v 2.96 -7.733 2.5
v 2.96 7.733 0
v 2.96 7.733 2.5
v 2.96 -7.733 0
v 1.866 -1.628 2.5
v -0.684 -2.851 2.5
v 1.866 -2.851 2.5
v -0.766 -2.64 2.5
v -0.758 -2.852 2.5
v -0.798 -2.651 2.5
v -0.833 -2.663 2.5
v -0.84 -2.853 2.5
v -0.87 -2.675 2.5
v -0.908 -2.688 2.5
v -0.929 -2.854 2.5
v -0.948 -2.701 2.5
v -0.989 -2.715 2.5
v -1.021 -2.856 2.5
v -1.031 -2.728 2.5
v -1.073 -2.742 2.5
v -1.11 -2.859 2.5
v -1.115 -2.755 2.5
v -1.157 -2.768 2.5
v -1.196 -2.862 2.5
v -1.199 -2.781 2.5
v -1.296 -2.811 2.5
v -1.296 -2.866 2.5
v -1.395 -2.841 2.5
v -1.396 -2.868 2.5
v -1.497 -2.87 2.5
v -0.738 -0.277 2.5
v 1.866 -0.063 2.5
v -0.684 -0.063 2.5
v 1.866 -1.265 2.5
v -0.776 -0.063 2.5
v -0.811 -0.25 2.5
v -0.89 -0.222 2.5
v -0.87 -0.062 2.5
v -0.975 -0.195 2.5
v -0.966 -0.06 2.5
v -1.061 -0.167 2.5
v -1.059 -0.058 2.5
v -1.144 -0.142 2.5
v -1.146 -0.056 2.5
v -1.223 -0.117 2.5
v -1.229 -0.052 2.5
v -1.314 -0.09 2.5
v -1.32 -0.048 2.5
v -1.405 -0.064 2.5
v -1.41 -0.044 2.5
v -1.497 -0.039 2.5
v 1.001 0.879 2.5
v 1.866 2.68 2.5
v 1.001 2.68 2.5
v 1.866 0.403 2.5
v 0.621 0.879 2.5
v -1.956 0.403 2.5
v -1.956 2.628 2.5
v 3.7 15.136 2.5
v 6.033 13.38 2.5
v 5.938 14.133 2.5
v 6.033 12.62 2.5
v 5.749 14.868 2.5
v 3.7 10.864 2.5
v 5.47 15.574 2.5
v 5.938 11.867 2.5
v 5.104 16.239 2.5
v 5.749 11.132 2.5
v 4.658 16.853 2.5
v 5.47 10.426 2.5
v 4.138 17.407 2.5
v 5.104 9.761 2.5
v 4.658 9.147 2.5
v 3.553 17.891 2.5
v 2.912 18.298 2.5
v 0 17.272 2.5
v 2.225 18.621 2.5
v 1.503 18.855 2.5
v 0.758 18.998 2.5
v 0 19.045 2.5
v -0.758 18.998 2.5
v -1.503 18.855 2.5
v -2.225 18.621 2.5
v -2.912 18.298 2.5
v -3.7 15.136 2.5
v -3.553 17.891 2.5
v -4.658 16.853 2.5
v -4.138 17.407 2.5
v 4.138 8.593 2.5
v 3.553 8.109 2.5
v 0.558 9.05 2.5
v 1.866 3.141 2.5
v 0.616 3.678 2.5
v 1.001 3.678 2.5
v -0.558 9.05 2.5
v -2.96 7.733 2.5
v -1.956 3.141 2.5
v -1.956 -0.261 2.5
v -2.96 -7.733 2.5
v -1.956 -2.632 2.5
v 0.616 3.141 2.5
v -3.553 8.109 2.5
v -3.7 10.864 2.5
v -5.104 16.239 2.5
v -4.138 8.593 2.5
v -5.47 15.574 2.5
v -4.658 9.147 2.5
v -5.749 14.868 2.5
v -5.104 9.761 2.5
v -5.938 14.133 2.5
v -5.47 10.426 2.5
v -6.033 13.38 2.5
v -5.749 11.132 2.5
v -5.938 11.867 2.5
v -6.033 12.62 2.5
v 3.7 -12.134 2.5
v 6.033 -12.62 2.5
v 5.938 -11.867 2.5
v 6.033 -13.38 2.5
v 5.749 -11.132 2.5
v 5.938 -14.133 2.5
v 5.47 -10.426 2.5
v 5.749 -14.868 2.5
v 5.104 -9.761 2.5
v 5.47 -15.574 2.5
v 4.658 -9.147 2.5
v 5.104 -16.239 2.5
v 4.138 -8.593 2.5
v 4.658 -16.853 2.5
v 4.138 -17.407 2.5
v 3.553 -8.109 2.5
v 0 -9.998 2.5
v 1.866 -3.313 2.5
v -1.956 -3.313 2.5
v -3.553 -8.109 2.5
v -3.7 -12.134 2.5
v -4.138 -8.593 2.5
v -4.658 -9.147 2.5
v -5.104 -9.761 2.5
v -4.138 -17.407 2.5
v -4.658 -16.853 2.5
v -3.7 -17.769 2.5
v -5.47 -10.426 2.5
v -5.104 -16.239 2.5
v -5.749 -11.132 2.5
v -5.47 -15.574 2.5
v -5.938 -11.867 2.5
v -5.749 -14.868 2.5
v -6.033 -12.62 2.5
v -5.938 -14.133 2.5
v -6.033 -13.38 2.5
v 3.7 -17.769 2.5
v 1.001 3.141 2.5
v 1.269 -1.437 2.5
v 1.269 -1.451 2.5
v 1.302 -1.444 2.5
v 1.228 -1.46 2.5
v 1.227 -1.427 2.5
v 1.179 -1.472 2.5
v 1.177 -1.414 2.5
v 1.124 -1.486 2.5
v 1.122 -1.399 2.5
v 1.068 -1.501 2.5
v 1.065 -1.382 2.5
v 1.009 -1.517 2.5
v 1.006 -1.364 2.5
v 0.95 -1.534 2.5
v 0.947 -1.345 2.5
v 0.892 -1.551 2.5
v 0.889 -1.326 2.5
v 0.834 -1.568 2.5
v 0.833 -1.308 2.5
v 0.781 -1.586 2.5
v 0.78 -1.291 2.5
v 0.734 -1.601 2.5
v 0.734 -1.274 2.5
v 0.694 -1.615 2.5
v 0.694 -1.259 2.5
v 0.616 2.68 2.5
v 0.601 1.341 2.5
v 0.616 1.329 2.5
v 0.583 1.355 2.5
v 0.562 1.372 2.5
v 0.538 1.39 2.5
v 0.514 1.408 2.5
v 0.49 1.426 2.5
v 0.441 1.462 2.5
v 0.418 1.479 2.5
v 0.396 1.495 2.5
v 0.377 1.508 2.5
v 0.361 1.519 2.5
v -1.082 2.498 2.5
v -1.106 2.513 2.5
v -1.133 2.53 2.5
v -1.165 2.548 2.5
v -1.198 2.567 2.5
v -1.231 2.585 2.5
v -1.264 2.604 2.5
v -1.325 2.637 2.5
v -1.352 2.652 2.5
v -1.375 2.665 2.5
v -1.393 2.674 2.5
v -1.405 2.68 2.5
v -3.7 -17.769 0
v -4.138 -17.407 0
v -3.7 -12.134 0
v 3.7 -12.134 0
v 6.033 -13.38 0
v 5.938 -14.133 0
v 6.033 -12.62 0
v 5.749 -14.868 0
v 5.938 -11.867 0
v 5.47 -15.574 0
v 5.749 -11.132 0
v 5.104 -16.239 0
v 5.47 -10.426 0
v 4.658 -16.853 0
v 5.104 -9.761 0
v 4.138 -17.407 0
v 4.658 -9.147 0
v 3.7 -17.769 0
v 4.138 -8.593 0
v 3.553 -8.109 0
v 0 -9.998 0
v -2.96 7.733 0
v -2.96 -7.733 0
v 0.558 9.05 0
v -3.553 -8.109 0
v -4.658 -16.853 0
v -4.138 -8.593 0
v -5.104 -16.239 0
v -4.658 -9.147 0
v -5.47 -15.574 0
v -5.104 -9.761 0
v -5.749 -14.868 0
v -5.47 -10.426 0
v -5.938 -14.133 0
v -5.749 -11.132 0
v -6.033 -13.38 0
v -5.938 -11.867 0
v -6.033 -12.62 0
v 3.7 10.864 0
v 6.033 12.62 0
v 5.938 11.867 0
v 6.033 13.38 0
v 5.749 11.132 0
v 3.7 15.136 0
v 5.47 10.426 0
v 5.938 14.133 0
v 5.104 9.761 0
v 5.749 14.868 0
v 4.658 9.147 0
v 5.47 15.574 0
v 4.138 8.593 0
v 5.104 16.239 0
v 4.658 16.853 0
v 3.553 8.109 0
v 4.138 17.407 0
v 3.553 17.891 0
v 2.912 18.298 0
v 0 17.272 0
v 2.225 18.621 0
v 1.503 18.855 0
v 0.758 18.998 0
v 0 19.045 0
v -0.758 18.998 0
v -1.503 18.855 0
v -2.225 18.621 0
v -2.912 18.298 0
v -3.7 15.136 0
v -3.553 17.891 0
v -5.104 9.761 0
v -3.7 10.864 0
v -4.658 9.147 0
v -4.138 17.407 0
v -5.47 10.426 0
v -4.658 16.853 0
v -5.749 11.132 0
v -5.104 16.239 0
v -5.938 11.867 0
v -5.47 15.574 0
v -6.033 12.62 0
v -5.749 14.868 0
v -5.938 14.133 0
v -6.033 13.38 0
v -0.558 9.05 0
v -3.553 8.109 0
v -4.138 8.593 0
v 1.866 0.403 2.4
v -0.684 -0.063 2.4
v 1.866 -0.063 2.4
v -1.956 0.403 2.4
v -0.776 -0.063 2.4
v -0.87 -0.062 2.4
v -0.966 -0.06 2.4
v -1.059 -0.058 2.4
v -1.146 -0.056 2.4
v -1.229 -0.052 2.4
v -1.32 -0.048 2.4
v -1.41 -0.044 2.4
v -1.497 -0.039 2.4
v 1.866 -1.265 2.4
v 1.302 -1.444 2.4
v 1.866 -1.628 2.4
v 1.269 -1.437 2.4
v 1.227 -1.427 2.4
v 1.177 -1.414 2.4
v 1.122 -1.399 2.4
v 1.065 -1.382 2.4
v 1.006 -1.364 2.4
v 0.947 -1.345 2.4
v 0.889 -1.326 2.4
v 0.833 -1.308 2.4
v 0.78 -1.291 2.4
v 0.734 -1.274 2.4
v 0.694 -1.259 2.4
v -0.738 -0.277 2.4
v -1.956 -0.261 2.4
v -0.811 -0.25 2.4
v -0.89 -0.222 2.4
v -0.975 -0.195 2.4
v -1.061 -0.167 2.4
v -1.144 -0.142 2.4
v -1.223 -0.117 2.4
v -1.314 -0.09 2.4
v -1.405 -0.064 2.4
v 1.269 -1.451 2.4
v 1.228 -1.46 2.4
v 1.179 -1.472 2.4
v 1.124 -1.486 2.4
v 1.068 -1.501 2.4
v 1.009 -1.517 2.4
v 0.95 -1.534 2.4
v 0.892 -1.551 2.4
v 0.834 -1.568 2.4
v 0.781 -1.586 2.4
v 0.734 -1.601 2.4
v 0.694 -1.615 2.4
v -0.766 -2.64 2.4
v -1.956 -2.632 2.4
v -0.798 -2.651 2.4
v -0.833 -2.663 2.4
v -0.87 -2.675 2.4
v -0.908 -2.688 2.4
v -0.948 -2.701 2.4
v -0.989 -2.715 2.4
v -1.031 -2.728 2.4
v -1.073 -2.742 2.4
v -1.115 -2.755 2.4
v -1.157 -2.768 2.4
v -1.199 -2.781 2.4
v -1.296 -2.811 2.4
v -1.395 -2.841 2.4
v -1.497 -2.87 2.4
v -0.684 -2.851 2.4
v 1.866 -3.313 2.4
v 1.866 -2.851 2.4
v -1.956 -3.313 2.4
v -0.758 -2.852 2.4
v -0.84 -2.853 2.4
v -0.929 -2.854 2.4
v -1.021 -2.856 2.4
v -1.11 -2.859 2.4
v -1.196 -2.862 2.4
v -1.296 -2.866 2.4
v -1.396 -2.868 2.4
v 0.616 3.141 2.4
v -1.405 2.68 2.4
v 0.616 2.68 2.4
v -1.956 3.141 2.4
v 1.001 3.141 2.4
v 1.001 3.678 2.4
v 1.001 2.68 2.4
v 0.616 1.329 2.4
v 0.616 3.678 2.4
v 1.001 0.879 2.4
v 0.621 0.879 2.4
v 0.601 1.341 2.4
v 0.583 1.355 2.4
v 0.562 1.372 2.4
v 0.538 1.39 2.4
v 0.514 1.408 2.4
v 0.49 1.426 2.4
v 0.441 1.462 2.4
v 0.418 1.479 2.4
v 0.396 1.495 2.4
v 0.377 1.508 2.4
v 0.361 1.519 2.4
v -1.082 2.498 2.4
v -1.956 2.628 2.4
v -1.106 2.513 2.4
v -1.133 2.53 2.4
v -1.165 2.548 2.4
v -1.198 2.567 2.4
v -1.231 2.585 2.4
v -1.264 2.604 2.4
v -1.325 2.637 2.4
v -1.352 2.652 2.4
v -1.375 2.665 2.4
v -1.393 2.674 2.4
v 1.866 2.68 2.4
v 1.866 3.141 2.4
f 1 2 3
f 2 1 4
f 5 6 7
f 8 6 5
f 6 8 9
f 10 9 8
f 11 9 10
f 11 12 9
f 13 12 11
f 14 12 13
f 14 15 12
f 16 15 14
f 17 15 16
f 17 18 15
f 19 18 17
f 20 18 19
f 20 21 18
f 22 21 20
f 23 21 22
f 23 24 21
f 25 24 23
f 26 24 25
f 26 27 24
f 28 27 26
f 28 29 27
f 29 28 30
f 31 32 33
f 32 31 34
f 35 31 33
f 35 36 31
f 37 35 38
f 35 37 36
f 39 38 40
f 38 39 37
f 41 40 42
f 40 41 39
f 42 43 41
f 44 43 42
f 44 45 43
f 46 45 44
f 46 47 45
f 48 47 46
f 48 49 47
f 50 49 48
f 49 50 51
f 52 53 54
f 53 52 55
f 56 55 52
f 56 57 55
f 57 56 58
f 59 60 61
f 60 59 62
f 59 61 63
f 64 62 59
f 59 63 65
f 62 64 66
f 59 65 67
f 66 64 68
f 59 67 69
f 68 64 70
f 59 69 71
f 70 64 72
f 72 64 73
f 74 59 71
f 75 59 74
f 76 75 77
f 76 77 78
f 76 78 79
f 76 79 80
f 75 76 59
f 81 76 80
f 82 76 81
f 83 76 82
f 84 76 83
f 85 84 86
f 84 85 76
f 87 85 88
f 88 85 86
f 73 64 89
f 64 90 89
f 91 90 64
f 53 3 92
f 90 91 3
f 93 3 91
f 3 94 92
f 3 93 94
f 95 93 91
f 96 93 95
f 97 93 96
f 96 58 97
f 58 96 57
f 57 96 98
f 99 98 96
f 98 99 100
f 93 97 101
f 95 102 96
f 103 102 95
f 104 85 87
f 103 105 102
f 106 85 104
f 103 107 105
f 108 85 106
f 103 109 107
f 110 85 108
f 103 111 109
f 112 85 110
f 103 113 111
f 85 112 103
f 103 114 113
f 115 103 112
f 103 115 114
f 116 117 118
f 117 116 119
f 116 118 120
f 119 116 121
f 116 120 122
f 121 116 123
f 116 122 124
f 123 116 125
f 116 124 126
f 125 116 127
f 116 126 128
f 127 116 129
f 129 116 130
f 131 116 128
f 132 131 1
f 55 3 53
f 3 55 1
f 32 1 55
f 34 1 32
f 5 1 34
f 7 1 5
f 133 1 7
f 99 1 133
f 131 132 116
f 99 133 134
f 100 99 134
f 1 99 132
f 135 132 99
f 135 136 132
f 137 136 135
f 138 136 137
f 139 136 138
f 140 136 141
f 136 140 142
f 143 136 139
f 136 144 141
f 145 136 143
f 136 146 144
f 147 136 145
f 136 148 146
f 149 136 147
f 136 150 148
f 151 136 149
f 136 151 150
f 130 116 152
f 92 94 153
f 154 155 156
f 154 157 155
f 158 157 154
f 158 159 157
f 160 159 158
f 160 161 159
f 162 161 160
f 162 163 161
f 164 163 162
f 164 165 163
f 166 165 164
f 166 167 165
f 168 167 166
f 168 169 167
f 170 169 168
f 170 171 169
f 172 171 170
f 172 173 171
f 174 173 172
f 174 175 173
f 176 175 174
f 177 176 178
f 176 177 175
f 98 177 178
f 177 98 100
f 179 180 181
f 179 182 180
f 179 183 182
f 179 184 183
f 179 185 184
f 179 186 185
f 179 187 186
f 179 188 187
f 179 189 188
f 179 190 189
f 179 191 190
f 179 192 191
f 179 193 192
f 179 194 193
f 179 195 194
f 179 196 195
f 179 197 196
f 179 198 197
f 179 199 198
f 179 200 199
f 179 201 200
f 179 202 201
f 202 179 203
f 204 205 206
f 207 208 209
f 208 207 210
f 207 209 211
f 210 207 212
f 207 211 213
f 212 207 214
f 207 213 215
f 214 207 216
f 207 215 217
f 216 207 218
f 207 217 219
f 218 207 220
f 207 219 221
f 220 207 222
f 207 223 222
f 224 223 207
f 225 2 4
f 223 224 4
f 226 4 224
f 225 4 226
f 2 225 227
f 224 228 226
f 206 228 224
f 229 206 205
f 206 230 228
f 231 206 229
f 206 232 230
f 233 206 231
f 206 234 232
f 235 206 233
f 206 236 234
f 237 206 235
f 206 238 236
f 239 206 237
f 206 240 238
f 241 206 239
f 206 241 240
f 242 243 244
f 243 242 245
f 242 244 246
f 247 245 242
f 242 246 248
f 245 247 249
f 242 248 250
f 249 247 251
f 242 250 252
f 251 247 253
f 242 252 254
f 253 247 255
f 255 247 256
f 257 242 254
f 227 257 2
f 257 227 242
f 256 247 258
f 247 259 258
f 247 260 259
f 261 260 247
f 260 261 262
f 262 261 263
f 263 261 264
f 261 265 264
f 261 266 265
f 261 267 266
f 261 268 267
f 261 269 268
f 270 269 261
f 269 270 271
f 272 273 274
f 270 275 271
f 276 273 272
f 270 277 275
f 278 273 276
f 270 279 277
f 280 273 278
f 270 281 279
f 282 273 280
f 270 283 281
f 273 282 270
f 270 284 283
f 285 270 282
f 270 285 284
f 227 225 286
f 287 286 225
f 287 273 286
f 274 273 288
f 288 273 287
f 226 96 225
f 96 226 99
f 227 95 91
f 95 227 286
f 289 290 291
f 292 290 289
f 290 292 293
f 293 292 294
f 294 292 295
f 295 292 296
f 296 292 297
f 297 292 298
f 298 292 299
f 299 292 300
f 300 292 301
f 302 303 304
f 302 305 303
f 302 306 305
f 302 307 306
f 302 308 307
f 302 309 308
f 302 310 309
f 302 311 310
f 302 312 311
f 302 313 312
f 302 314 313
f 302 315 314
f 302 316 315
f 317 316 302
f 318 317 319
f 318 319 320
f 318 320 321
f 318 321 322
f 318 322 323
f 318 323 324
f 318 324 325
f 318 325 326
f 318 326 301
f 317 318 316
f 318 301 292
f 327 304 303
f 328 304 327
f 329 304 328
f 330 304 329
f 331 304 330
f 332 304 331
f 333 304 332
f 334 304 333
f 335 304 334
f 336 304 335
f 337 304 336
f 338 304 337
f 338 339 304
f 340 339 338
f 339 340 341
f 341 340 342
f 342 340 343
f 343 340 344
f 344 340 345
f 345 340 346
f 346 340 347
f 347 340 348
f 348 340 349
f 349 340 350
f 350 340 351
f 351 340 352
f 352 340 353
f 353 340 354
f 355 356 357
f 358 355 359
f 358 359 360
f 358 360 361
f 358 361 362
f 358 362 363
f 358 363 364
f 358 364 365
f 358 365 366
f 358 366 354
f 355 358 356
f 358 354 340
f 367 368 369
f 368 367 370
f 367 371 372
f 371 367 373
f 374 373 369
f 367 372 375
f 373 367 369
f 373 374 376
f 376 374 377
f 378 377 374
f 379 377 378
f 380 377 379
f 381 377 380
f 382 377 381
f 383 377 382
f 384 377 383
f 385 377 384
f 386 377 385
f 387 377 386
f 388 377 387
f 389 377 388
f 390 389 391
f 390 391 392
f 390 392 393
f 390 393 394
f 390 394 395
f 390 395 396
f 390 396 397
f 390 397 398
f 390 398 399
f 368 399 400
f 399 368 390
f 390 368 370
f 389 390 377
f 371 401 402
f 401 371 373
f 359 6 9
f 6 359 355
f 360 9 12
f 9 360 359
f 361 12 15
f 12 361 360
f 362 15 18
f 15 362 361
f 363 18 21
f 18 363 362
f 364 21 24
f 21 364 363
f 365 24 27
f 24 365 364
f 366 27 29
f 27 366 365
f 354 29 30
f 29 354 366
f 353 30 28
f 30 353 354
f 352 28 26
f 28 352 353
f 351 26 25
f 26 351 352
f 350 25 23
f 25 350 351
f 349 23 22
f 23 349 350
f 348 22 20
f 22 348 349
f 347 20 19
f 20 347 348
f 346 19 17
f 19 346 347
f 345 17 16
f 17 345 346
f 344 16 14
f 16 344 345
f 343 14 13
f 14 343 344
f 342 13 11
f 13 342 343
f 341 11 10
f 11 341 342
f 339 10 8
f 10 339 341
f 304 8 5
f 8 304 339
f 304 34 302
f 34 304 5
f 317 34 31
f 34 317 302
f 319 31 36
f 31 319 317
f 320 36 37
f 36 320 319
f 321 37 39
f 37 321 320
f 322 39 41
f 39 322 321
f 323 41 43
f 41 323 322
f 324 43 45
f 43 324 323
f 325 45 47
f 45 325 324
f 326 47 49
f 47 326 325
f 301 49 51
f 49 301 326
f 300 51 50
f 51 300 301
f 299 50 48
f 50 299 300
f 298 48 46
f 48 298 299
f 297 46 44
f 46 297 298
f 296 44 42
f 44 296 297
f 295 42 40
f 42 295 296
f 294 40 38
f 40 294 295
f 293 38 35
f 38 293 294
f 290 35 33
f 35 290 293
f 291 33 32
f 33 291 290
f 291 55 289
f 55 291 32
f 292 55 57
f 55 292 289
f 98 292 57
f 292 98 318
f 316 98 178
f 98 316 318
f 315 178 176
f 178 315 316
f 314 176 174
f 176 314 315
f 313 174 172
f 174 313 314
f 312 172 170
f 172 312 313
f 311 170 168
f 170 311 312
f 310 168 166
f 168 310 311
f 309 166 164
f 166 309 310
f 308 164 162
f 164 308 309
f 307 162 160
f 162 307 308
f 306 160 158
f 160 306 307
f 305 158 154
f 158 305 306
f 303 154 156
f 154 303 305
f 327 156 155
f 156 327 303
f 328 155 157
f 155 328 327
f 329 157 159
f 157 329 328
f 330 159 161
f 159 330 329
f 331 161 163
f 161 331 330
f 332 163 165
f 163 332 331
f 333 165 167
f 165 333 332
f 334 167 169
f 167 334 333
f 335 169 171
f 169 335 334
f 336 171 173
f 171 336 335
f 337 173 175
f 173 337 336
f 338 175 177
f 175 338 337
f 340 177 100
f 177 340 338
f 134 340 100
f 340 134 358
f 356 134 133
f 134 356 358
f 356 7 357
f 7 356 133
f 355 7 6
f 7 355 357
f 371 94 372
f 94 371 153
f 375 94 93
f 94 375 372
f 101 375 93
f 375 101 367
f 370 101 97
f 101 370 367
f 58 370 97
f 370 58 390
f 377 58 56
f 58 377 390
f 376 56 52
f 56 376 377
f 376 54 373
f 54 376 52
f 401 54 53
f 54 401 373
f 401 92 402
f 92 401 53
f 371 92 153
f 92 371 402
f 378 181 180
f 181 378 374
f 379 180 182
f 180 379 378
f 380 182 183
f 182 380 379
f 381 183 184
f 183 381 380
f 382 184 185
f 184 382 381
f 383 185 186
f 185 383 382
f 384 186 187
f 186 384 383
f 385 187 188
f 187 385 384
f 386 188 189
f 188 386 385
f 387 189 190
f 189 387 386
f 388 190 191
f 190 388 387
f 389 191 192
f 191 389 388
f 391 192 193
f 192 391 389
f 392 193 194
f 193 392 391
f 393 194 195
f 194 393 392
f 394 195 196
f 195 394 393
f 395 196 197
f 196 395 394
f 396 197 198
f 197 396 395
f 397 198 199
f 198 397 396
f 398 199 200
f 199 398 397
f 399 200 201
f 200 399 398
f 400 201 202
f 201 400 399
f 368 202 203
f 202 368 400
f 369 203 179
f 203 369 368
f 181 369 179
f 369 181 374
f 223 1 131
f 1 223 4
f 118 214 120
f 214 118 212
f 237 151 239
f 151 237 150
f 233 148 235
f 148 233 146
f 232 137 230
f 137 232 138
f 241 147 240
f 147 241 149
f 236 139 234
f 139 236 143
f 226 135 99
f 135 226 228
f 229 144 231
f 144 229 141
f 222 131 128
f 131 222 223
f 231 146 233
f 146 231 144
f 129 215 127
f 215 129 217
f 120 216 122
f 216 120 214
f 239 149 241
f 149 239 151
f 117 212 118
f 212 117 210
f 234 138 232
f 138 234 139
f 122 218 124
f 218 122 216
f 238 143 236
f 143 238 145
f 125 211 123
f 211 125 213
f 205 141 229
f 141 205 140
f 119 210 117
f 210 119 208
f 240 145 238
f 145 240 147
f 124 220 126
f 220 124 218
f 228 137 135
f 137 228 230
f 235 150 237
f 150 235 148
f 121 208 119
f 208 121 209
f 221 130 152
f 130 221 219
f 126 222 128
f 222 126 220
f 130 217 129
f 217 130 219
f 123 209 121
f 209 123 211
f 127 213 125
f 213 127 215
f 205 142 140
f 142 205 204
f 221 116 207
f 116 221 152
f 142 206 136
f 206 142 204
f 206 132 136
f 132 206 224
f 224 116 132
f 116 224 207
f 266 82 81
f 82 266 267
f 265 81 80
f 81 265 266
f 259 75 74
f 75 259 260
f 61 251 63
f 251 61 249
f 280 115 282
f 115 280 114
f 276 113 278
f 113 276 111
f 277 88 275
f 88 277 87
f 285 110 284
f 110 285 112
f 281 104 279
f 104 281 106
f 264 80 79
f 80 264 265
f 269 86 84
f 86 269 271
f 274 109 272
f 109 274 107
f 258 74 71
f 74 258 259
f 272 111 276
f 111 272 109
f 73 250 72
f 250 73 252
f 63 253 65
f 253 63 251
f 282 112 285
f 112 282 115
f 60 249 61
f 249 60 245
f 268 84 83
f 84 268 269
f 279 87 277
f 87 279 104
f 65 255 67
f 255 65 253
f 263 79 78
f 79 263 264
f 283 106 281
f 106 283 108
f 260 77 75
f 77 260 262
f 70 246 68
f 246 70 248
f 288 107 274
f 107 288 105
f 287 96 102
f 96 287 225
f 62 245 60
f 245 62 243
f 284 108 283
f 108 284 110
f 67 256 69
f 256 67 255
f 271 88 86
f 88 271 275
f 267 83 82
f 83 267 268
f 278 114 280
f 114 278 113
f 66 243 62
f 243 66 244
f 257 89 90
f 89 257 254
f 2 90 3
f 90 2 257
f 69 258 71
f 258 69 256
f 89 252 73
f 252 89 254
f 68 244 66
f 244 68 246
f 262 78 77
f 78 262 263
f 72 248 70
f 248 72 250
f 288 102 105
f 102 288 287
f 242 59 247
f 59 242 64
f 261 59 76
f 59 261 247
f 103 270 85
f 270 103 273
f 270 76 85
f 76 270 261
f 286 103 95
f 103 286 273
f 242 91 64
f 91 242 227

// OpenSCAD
//******************************************
//* Base configuration
//******************************************

//Set the nut properties
NUT_DIMENSION_METRIC = /*M*/4; // this is the number after M (eg. M4 -> 4)
// >>> NOTE <<<
// the metric parameter works ONLY for nuts from M1.6 up to M20
// If your nut has different size, please set it here:
// (leave -1 if you use metric)
NUT_DIMENSION = -1/*mm*/;

WRENCH_THICKNESS_MM         = 2.5;    // this is the thickness of the wrench   
WRENCH_LENGHT_MM            = 26;   // this is the lenght of the wrench
CORRECT_LENGTH_IF_TOO_SHORT = true; // correct wrench lenght if is too short according with nut size

// Choose if you want both closed and open heads, or only one of them
ADD_OPEN_HEAD = true;
ADD_CLOSED_HEAD = true;

//-------------------------------------------------------
// PRINT HINTS
// Higher the infill rate is, stronger the wrench will be
// I suggest, at least, a 30% honeycomb fill
//-------------------------------------------------------



//******************************************
//* Advanced configuration
//******************************************
// Change thickness of the border around nut hole
// A thicker border make wrench stronger, but wider
//  - Positive value: additional thickness around nut hole
//  - Negative value: less thickness around nut hole
fHeadBoardersAdditionalThickness = 0;

// According to your printer precision, you can change 
// the 'nut holes offset' value. This affect the size of nut hole.
// Positive value: bigger hole
// Negative value: smaller hole
fNutHoleOffet = 0.2;









//********************************************************************************
//* Do not modify below this line
//********************************************************************************

// Variables cannot be assigned with if statement, so do this trick
iNutDiameter = (NUT_DIMENSION > 0) ? (NUT_DIMENSION) : (
	(NUT_DIMENSION_METRIC == 1.6) ? 3.2 : (
		(NUT_DIMENSION_METRIC == 2) ? 4 : (
			(NUT_DIMENSION_METRIC == 2.5) ? 5 : (
				(NUT_DIMENSION_METRIC == 3) ? 5.5 : (
					(NUT_DIMENSION_METRIC == 4) ? 7 : (
						(NUT_DIMENSION_METRIC == 5) ? 8 : (
							(NUT_DIMENSION_METRIC == 6) ? 10 : (
								(NUT_DIMENSION_METRIC == 8) ? 13 : (
									(NUT_DIMENSION_METRIC == 10) ? 16 : (
										(NUT_DIMENSION_METRIC == 12) ? 18 : (
											(NUT_DIMENSION_METRIC == 14) ? 21 : (
												(NUT_DIMENSION_METRIC == 16) ? 24 : (
													(NUT_DIMENSION_METRIC == 20) ? 30 : (
														// For nut > M20 or not standard return 0
														0
													)
												)
											)
										)
									)
								)
							)
						)
					)
				)
			)
		)
	)
);

iNutThickness = WRENCH_THICKNESS_MM;

// Calculate the radius of cylinder which model the nut 
// (it will be a 6-faces cylinder, so an hexagon)
iNutCylinderRadius = iNutDiameter/2 + fNutHoleOffet;

// Calculate the radius of the circular part around the
// nut hole.


// Calculate the header space around nut hole using
// linear function
iHeadSpaceForM2 = min(2, fHeadBoardersAdditionalThickness);
iHeadSpaceForM10 = 7 + fHeadBoardersAdditionalThickness;  // 13mm of diameter

iM2Diameter = 4;
iM10Diameter = 13;
// two points are:
// A = (iM2Diameter, iHeadSpaceForM2) 
// B = (iM10Diameter, iHeadSpaceForM10)
//              yB - yA
//    y - yA = -------- (x - xA)
//              xB - xA
iHeaderRadiusOffset = ((iHeadSpaceForM10-iHeadSpaceForM2) / (iM10Diameter-iM2Diameter)) * (iNutDiameter - iM2Diameter) + iHeadSpaceForM2;

//iHeaderRadiusOffset = 0.225*iNutDiameter + 0.75;

echo("Nut diameter is:", iNutDiameter);
echo("Offset is:", iHeaderRadiusOffset);
iHeadRadius = iNutCylinderRadius + iHeaderRadiusOffset;

/*
 * See this page:
 * https://en.wikibooks.org/wiki/OpenSCAD_User_Manual/undersized_circular_objects
 */
module cylinder_outer(height,radius,fn)
{
   fudge = 1/cos(180/fn);
   cylinder(h=height,r=radius*fudge,$fn=fn);
}                                        

module createNutProfile()
{    
    // Add a little bit of offset on the height and traslate down
    // of the same amount, to avoid wrong booleand operation with
    // the rounded section
    iNutHeightOffset = 0.5;
    translate([0,0,-iNutHeightOffset/2]){
        rotate(a=[0,0,90]){
            // The nut profile is obtained from a cylinder with 6 faces
            cylinder_outer(iNutThickness+iNutHeightOffset, iNutCylinderRadius, 6);
        }
    }
}

module createNutAdditionalSquaredHole(iPosY)
{
    iSize = iNutCylinderRadius*2;
    iHeightOffset = 0.2;
    iHeight = WRENCH_THICKNESS_MM + iHeightOffset;
    translate([0,iPosY,iHeight/2 - iHeightOffset/2]){
        cube(size = [iSize, iSize, iHeight], center = true);
    };
}

module createCylindricalHead()
{    
    rotate(a=[0,0,90]){
        cylinder_outer(iNutThickness, iHeadRadius, 50);
    }
}

module createOpenHead(iPosY=0)
{
    translate([0,iPosY,0]){
        /*
         * The nut hexagon is created via 'cylinder outer' so
         * the cylinder diameter is the length of face-to-face segment
         * and NOT the angle-to-angle segment.
         * So we need to calculate it
         * According to https://en.wikipedia.org/wiki/Hexagon we calculate
         * the value of 'R'based on 'r'
         */    
        iNutAngleToAngleLenght = iNutCylinderRadius/ cos(30);    
        // Do the same for the cylinder around the nut hole
        iHeadAngleToAngleLenght = iHeadRadius/ cos(30);
        
        iAdjustNutPos = iNutAngleToAngleLenght/3;
        
        iDelta = (iHeadAngleToAngleLenght - iNutAngleToAngleLenght) - iAdjustNutPos - fHeadBoardersAdditionalThickness;
       
        difference(){
            createCylindricalHead();
            translate([0, -(iDelta), 0 / 2]) {
                createNutProfile();
            };
            createNutAdditionalSquaredHole(-(iDelta+iNutAngleToAngleLenght));
        }
        
    }    
    
}

module createClosedHead(iPosY=0)
{
    translate([0,iPosY,0]){ 
        difference(){       
            createCylindricalHead();
            createNutProfile();
        }
    }    
}

module createRoundedHandleEdge(iPosY, iHandleWidth)
{
    iRadius = iHandleWidth/2;
    translate([0,iPosY,0]){
        cylinder(h=WRENCH_THICKNESS_MM,r=iRadius,$fn=20);
    }
}

module create3DText(sText, iSize, iThickness)
{
    font = "Arial";
    //letter_size = 50;
    //letter_height = 1;
	// Use linear_extrude() to make the letters 3D objects as they
	// are only 2D shapes when only using text()
    
    linear_extrude(height = iThickness) {
        text(sText, size = iSize, font = font, halign = "center", valign = "center", $fn = 16);
    }
}

module addTextToHandle(sText, iPosY, iTextSize)
{
    iTextThickness = 0.4;
    
    iTextSize = min(iTextSize, 5);
    
    iTextYOffsetToBooleanSubtraction = 0.1;
    translate([0, iPosY, WRENCH_THICKNESS_MM - iTextYOffsetToBooleanSubtraction]){
        rotate([0,0,90]){
            create3DText(sText, iTextSize - 1, iTextThickness + iTextYOffsetToBooleanSubtraction);
        };
    };
}

iMinDist = 10;
function calculateCorrectedLenght() = ((WRENCH_LENGHT_MM - (iNutDiameter*2) > iMinDist) ? WRENCH_LENGHT_MM : (iNutDiameter*2 + iMinDist));

function getWrenchLenght() = ( (CORRECT_LENGTH_IF_TOO_SHORT == true) ? calculateCorrectedLenght() : WRENCH_LENGHT_MM );

module createHandle()
{
    // Calculate if the length user set
    iUserLenght = getWrenchLenght();
    
    iLength = iUserLenght - (iNutCylinderRadius*2 + 0.5);
    iWidth = iNutCylinderRadius*1.6;
    
    sText = (NUT_DIMENSION > 0) ? (str(NUT_DIMENSION, "mm")) : (str("M", NUT_DIMENSION_METRIC));
    
    union(){
        
        difference(){
            // Create the handle with a parallelepiped
            translate([0,0,(WRENCH_THICKNESS_MM/2)]){
                cube(
                    size = [
                        iWidth,
                        iLength,
                        WRENCH_THICKNESS_MM
                    ], 
                    center = true
                );
            };
            // Subtract the text
            //addTextToHandle(sText, (iLength/2) - 5, iWidth);
            addTextToHandle(sText, 0, iWidth);
        } // close difference()
        
        // Put a rounded edge if not both head exist
        if( ADD_OPEN_HEAD == false){                
            createRoundedHandleEdge(-(iLength/2), iWidth);
        }
        if(ADD_CLOSED_HEAD == false){
            createRoundedHandleEdge(iLength/2, iWidth);
        }
    } // close union()
    
}







// Create the handle section
createHandle();
// then closed and open section
iDistanceFromOrigin = getWrenchLenght()/2;
if( ADD_OPEN_HEAD == true){
    createOpenHead(-iDistanceFromOrigin);
}
if( ADD_CLOSED_HEAD == true){
    createClosedHead(iDistanceFromOrigin);
}
